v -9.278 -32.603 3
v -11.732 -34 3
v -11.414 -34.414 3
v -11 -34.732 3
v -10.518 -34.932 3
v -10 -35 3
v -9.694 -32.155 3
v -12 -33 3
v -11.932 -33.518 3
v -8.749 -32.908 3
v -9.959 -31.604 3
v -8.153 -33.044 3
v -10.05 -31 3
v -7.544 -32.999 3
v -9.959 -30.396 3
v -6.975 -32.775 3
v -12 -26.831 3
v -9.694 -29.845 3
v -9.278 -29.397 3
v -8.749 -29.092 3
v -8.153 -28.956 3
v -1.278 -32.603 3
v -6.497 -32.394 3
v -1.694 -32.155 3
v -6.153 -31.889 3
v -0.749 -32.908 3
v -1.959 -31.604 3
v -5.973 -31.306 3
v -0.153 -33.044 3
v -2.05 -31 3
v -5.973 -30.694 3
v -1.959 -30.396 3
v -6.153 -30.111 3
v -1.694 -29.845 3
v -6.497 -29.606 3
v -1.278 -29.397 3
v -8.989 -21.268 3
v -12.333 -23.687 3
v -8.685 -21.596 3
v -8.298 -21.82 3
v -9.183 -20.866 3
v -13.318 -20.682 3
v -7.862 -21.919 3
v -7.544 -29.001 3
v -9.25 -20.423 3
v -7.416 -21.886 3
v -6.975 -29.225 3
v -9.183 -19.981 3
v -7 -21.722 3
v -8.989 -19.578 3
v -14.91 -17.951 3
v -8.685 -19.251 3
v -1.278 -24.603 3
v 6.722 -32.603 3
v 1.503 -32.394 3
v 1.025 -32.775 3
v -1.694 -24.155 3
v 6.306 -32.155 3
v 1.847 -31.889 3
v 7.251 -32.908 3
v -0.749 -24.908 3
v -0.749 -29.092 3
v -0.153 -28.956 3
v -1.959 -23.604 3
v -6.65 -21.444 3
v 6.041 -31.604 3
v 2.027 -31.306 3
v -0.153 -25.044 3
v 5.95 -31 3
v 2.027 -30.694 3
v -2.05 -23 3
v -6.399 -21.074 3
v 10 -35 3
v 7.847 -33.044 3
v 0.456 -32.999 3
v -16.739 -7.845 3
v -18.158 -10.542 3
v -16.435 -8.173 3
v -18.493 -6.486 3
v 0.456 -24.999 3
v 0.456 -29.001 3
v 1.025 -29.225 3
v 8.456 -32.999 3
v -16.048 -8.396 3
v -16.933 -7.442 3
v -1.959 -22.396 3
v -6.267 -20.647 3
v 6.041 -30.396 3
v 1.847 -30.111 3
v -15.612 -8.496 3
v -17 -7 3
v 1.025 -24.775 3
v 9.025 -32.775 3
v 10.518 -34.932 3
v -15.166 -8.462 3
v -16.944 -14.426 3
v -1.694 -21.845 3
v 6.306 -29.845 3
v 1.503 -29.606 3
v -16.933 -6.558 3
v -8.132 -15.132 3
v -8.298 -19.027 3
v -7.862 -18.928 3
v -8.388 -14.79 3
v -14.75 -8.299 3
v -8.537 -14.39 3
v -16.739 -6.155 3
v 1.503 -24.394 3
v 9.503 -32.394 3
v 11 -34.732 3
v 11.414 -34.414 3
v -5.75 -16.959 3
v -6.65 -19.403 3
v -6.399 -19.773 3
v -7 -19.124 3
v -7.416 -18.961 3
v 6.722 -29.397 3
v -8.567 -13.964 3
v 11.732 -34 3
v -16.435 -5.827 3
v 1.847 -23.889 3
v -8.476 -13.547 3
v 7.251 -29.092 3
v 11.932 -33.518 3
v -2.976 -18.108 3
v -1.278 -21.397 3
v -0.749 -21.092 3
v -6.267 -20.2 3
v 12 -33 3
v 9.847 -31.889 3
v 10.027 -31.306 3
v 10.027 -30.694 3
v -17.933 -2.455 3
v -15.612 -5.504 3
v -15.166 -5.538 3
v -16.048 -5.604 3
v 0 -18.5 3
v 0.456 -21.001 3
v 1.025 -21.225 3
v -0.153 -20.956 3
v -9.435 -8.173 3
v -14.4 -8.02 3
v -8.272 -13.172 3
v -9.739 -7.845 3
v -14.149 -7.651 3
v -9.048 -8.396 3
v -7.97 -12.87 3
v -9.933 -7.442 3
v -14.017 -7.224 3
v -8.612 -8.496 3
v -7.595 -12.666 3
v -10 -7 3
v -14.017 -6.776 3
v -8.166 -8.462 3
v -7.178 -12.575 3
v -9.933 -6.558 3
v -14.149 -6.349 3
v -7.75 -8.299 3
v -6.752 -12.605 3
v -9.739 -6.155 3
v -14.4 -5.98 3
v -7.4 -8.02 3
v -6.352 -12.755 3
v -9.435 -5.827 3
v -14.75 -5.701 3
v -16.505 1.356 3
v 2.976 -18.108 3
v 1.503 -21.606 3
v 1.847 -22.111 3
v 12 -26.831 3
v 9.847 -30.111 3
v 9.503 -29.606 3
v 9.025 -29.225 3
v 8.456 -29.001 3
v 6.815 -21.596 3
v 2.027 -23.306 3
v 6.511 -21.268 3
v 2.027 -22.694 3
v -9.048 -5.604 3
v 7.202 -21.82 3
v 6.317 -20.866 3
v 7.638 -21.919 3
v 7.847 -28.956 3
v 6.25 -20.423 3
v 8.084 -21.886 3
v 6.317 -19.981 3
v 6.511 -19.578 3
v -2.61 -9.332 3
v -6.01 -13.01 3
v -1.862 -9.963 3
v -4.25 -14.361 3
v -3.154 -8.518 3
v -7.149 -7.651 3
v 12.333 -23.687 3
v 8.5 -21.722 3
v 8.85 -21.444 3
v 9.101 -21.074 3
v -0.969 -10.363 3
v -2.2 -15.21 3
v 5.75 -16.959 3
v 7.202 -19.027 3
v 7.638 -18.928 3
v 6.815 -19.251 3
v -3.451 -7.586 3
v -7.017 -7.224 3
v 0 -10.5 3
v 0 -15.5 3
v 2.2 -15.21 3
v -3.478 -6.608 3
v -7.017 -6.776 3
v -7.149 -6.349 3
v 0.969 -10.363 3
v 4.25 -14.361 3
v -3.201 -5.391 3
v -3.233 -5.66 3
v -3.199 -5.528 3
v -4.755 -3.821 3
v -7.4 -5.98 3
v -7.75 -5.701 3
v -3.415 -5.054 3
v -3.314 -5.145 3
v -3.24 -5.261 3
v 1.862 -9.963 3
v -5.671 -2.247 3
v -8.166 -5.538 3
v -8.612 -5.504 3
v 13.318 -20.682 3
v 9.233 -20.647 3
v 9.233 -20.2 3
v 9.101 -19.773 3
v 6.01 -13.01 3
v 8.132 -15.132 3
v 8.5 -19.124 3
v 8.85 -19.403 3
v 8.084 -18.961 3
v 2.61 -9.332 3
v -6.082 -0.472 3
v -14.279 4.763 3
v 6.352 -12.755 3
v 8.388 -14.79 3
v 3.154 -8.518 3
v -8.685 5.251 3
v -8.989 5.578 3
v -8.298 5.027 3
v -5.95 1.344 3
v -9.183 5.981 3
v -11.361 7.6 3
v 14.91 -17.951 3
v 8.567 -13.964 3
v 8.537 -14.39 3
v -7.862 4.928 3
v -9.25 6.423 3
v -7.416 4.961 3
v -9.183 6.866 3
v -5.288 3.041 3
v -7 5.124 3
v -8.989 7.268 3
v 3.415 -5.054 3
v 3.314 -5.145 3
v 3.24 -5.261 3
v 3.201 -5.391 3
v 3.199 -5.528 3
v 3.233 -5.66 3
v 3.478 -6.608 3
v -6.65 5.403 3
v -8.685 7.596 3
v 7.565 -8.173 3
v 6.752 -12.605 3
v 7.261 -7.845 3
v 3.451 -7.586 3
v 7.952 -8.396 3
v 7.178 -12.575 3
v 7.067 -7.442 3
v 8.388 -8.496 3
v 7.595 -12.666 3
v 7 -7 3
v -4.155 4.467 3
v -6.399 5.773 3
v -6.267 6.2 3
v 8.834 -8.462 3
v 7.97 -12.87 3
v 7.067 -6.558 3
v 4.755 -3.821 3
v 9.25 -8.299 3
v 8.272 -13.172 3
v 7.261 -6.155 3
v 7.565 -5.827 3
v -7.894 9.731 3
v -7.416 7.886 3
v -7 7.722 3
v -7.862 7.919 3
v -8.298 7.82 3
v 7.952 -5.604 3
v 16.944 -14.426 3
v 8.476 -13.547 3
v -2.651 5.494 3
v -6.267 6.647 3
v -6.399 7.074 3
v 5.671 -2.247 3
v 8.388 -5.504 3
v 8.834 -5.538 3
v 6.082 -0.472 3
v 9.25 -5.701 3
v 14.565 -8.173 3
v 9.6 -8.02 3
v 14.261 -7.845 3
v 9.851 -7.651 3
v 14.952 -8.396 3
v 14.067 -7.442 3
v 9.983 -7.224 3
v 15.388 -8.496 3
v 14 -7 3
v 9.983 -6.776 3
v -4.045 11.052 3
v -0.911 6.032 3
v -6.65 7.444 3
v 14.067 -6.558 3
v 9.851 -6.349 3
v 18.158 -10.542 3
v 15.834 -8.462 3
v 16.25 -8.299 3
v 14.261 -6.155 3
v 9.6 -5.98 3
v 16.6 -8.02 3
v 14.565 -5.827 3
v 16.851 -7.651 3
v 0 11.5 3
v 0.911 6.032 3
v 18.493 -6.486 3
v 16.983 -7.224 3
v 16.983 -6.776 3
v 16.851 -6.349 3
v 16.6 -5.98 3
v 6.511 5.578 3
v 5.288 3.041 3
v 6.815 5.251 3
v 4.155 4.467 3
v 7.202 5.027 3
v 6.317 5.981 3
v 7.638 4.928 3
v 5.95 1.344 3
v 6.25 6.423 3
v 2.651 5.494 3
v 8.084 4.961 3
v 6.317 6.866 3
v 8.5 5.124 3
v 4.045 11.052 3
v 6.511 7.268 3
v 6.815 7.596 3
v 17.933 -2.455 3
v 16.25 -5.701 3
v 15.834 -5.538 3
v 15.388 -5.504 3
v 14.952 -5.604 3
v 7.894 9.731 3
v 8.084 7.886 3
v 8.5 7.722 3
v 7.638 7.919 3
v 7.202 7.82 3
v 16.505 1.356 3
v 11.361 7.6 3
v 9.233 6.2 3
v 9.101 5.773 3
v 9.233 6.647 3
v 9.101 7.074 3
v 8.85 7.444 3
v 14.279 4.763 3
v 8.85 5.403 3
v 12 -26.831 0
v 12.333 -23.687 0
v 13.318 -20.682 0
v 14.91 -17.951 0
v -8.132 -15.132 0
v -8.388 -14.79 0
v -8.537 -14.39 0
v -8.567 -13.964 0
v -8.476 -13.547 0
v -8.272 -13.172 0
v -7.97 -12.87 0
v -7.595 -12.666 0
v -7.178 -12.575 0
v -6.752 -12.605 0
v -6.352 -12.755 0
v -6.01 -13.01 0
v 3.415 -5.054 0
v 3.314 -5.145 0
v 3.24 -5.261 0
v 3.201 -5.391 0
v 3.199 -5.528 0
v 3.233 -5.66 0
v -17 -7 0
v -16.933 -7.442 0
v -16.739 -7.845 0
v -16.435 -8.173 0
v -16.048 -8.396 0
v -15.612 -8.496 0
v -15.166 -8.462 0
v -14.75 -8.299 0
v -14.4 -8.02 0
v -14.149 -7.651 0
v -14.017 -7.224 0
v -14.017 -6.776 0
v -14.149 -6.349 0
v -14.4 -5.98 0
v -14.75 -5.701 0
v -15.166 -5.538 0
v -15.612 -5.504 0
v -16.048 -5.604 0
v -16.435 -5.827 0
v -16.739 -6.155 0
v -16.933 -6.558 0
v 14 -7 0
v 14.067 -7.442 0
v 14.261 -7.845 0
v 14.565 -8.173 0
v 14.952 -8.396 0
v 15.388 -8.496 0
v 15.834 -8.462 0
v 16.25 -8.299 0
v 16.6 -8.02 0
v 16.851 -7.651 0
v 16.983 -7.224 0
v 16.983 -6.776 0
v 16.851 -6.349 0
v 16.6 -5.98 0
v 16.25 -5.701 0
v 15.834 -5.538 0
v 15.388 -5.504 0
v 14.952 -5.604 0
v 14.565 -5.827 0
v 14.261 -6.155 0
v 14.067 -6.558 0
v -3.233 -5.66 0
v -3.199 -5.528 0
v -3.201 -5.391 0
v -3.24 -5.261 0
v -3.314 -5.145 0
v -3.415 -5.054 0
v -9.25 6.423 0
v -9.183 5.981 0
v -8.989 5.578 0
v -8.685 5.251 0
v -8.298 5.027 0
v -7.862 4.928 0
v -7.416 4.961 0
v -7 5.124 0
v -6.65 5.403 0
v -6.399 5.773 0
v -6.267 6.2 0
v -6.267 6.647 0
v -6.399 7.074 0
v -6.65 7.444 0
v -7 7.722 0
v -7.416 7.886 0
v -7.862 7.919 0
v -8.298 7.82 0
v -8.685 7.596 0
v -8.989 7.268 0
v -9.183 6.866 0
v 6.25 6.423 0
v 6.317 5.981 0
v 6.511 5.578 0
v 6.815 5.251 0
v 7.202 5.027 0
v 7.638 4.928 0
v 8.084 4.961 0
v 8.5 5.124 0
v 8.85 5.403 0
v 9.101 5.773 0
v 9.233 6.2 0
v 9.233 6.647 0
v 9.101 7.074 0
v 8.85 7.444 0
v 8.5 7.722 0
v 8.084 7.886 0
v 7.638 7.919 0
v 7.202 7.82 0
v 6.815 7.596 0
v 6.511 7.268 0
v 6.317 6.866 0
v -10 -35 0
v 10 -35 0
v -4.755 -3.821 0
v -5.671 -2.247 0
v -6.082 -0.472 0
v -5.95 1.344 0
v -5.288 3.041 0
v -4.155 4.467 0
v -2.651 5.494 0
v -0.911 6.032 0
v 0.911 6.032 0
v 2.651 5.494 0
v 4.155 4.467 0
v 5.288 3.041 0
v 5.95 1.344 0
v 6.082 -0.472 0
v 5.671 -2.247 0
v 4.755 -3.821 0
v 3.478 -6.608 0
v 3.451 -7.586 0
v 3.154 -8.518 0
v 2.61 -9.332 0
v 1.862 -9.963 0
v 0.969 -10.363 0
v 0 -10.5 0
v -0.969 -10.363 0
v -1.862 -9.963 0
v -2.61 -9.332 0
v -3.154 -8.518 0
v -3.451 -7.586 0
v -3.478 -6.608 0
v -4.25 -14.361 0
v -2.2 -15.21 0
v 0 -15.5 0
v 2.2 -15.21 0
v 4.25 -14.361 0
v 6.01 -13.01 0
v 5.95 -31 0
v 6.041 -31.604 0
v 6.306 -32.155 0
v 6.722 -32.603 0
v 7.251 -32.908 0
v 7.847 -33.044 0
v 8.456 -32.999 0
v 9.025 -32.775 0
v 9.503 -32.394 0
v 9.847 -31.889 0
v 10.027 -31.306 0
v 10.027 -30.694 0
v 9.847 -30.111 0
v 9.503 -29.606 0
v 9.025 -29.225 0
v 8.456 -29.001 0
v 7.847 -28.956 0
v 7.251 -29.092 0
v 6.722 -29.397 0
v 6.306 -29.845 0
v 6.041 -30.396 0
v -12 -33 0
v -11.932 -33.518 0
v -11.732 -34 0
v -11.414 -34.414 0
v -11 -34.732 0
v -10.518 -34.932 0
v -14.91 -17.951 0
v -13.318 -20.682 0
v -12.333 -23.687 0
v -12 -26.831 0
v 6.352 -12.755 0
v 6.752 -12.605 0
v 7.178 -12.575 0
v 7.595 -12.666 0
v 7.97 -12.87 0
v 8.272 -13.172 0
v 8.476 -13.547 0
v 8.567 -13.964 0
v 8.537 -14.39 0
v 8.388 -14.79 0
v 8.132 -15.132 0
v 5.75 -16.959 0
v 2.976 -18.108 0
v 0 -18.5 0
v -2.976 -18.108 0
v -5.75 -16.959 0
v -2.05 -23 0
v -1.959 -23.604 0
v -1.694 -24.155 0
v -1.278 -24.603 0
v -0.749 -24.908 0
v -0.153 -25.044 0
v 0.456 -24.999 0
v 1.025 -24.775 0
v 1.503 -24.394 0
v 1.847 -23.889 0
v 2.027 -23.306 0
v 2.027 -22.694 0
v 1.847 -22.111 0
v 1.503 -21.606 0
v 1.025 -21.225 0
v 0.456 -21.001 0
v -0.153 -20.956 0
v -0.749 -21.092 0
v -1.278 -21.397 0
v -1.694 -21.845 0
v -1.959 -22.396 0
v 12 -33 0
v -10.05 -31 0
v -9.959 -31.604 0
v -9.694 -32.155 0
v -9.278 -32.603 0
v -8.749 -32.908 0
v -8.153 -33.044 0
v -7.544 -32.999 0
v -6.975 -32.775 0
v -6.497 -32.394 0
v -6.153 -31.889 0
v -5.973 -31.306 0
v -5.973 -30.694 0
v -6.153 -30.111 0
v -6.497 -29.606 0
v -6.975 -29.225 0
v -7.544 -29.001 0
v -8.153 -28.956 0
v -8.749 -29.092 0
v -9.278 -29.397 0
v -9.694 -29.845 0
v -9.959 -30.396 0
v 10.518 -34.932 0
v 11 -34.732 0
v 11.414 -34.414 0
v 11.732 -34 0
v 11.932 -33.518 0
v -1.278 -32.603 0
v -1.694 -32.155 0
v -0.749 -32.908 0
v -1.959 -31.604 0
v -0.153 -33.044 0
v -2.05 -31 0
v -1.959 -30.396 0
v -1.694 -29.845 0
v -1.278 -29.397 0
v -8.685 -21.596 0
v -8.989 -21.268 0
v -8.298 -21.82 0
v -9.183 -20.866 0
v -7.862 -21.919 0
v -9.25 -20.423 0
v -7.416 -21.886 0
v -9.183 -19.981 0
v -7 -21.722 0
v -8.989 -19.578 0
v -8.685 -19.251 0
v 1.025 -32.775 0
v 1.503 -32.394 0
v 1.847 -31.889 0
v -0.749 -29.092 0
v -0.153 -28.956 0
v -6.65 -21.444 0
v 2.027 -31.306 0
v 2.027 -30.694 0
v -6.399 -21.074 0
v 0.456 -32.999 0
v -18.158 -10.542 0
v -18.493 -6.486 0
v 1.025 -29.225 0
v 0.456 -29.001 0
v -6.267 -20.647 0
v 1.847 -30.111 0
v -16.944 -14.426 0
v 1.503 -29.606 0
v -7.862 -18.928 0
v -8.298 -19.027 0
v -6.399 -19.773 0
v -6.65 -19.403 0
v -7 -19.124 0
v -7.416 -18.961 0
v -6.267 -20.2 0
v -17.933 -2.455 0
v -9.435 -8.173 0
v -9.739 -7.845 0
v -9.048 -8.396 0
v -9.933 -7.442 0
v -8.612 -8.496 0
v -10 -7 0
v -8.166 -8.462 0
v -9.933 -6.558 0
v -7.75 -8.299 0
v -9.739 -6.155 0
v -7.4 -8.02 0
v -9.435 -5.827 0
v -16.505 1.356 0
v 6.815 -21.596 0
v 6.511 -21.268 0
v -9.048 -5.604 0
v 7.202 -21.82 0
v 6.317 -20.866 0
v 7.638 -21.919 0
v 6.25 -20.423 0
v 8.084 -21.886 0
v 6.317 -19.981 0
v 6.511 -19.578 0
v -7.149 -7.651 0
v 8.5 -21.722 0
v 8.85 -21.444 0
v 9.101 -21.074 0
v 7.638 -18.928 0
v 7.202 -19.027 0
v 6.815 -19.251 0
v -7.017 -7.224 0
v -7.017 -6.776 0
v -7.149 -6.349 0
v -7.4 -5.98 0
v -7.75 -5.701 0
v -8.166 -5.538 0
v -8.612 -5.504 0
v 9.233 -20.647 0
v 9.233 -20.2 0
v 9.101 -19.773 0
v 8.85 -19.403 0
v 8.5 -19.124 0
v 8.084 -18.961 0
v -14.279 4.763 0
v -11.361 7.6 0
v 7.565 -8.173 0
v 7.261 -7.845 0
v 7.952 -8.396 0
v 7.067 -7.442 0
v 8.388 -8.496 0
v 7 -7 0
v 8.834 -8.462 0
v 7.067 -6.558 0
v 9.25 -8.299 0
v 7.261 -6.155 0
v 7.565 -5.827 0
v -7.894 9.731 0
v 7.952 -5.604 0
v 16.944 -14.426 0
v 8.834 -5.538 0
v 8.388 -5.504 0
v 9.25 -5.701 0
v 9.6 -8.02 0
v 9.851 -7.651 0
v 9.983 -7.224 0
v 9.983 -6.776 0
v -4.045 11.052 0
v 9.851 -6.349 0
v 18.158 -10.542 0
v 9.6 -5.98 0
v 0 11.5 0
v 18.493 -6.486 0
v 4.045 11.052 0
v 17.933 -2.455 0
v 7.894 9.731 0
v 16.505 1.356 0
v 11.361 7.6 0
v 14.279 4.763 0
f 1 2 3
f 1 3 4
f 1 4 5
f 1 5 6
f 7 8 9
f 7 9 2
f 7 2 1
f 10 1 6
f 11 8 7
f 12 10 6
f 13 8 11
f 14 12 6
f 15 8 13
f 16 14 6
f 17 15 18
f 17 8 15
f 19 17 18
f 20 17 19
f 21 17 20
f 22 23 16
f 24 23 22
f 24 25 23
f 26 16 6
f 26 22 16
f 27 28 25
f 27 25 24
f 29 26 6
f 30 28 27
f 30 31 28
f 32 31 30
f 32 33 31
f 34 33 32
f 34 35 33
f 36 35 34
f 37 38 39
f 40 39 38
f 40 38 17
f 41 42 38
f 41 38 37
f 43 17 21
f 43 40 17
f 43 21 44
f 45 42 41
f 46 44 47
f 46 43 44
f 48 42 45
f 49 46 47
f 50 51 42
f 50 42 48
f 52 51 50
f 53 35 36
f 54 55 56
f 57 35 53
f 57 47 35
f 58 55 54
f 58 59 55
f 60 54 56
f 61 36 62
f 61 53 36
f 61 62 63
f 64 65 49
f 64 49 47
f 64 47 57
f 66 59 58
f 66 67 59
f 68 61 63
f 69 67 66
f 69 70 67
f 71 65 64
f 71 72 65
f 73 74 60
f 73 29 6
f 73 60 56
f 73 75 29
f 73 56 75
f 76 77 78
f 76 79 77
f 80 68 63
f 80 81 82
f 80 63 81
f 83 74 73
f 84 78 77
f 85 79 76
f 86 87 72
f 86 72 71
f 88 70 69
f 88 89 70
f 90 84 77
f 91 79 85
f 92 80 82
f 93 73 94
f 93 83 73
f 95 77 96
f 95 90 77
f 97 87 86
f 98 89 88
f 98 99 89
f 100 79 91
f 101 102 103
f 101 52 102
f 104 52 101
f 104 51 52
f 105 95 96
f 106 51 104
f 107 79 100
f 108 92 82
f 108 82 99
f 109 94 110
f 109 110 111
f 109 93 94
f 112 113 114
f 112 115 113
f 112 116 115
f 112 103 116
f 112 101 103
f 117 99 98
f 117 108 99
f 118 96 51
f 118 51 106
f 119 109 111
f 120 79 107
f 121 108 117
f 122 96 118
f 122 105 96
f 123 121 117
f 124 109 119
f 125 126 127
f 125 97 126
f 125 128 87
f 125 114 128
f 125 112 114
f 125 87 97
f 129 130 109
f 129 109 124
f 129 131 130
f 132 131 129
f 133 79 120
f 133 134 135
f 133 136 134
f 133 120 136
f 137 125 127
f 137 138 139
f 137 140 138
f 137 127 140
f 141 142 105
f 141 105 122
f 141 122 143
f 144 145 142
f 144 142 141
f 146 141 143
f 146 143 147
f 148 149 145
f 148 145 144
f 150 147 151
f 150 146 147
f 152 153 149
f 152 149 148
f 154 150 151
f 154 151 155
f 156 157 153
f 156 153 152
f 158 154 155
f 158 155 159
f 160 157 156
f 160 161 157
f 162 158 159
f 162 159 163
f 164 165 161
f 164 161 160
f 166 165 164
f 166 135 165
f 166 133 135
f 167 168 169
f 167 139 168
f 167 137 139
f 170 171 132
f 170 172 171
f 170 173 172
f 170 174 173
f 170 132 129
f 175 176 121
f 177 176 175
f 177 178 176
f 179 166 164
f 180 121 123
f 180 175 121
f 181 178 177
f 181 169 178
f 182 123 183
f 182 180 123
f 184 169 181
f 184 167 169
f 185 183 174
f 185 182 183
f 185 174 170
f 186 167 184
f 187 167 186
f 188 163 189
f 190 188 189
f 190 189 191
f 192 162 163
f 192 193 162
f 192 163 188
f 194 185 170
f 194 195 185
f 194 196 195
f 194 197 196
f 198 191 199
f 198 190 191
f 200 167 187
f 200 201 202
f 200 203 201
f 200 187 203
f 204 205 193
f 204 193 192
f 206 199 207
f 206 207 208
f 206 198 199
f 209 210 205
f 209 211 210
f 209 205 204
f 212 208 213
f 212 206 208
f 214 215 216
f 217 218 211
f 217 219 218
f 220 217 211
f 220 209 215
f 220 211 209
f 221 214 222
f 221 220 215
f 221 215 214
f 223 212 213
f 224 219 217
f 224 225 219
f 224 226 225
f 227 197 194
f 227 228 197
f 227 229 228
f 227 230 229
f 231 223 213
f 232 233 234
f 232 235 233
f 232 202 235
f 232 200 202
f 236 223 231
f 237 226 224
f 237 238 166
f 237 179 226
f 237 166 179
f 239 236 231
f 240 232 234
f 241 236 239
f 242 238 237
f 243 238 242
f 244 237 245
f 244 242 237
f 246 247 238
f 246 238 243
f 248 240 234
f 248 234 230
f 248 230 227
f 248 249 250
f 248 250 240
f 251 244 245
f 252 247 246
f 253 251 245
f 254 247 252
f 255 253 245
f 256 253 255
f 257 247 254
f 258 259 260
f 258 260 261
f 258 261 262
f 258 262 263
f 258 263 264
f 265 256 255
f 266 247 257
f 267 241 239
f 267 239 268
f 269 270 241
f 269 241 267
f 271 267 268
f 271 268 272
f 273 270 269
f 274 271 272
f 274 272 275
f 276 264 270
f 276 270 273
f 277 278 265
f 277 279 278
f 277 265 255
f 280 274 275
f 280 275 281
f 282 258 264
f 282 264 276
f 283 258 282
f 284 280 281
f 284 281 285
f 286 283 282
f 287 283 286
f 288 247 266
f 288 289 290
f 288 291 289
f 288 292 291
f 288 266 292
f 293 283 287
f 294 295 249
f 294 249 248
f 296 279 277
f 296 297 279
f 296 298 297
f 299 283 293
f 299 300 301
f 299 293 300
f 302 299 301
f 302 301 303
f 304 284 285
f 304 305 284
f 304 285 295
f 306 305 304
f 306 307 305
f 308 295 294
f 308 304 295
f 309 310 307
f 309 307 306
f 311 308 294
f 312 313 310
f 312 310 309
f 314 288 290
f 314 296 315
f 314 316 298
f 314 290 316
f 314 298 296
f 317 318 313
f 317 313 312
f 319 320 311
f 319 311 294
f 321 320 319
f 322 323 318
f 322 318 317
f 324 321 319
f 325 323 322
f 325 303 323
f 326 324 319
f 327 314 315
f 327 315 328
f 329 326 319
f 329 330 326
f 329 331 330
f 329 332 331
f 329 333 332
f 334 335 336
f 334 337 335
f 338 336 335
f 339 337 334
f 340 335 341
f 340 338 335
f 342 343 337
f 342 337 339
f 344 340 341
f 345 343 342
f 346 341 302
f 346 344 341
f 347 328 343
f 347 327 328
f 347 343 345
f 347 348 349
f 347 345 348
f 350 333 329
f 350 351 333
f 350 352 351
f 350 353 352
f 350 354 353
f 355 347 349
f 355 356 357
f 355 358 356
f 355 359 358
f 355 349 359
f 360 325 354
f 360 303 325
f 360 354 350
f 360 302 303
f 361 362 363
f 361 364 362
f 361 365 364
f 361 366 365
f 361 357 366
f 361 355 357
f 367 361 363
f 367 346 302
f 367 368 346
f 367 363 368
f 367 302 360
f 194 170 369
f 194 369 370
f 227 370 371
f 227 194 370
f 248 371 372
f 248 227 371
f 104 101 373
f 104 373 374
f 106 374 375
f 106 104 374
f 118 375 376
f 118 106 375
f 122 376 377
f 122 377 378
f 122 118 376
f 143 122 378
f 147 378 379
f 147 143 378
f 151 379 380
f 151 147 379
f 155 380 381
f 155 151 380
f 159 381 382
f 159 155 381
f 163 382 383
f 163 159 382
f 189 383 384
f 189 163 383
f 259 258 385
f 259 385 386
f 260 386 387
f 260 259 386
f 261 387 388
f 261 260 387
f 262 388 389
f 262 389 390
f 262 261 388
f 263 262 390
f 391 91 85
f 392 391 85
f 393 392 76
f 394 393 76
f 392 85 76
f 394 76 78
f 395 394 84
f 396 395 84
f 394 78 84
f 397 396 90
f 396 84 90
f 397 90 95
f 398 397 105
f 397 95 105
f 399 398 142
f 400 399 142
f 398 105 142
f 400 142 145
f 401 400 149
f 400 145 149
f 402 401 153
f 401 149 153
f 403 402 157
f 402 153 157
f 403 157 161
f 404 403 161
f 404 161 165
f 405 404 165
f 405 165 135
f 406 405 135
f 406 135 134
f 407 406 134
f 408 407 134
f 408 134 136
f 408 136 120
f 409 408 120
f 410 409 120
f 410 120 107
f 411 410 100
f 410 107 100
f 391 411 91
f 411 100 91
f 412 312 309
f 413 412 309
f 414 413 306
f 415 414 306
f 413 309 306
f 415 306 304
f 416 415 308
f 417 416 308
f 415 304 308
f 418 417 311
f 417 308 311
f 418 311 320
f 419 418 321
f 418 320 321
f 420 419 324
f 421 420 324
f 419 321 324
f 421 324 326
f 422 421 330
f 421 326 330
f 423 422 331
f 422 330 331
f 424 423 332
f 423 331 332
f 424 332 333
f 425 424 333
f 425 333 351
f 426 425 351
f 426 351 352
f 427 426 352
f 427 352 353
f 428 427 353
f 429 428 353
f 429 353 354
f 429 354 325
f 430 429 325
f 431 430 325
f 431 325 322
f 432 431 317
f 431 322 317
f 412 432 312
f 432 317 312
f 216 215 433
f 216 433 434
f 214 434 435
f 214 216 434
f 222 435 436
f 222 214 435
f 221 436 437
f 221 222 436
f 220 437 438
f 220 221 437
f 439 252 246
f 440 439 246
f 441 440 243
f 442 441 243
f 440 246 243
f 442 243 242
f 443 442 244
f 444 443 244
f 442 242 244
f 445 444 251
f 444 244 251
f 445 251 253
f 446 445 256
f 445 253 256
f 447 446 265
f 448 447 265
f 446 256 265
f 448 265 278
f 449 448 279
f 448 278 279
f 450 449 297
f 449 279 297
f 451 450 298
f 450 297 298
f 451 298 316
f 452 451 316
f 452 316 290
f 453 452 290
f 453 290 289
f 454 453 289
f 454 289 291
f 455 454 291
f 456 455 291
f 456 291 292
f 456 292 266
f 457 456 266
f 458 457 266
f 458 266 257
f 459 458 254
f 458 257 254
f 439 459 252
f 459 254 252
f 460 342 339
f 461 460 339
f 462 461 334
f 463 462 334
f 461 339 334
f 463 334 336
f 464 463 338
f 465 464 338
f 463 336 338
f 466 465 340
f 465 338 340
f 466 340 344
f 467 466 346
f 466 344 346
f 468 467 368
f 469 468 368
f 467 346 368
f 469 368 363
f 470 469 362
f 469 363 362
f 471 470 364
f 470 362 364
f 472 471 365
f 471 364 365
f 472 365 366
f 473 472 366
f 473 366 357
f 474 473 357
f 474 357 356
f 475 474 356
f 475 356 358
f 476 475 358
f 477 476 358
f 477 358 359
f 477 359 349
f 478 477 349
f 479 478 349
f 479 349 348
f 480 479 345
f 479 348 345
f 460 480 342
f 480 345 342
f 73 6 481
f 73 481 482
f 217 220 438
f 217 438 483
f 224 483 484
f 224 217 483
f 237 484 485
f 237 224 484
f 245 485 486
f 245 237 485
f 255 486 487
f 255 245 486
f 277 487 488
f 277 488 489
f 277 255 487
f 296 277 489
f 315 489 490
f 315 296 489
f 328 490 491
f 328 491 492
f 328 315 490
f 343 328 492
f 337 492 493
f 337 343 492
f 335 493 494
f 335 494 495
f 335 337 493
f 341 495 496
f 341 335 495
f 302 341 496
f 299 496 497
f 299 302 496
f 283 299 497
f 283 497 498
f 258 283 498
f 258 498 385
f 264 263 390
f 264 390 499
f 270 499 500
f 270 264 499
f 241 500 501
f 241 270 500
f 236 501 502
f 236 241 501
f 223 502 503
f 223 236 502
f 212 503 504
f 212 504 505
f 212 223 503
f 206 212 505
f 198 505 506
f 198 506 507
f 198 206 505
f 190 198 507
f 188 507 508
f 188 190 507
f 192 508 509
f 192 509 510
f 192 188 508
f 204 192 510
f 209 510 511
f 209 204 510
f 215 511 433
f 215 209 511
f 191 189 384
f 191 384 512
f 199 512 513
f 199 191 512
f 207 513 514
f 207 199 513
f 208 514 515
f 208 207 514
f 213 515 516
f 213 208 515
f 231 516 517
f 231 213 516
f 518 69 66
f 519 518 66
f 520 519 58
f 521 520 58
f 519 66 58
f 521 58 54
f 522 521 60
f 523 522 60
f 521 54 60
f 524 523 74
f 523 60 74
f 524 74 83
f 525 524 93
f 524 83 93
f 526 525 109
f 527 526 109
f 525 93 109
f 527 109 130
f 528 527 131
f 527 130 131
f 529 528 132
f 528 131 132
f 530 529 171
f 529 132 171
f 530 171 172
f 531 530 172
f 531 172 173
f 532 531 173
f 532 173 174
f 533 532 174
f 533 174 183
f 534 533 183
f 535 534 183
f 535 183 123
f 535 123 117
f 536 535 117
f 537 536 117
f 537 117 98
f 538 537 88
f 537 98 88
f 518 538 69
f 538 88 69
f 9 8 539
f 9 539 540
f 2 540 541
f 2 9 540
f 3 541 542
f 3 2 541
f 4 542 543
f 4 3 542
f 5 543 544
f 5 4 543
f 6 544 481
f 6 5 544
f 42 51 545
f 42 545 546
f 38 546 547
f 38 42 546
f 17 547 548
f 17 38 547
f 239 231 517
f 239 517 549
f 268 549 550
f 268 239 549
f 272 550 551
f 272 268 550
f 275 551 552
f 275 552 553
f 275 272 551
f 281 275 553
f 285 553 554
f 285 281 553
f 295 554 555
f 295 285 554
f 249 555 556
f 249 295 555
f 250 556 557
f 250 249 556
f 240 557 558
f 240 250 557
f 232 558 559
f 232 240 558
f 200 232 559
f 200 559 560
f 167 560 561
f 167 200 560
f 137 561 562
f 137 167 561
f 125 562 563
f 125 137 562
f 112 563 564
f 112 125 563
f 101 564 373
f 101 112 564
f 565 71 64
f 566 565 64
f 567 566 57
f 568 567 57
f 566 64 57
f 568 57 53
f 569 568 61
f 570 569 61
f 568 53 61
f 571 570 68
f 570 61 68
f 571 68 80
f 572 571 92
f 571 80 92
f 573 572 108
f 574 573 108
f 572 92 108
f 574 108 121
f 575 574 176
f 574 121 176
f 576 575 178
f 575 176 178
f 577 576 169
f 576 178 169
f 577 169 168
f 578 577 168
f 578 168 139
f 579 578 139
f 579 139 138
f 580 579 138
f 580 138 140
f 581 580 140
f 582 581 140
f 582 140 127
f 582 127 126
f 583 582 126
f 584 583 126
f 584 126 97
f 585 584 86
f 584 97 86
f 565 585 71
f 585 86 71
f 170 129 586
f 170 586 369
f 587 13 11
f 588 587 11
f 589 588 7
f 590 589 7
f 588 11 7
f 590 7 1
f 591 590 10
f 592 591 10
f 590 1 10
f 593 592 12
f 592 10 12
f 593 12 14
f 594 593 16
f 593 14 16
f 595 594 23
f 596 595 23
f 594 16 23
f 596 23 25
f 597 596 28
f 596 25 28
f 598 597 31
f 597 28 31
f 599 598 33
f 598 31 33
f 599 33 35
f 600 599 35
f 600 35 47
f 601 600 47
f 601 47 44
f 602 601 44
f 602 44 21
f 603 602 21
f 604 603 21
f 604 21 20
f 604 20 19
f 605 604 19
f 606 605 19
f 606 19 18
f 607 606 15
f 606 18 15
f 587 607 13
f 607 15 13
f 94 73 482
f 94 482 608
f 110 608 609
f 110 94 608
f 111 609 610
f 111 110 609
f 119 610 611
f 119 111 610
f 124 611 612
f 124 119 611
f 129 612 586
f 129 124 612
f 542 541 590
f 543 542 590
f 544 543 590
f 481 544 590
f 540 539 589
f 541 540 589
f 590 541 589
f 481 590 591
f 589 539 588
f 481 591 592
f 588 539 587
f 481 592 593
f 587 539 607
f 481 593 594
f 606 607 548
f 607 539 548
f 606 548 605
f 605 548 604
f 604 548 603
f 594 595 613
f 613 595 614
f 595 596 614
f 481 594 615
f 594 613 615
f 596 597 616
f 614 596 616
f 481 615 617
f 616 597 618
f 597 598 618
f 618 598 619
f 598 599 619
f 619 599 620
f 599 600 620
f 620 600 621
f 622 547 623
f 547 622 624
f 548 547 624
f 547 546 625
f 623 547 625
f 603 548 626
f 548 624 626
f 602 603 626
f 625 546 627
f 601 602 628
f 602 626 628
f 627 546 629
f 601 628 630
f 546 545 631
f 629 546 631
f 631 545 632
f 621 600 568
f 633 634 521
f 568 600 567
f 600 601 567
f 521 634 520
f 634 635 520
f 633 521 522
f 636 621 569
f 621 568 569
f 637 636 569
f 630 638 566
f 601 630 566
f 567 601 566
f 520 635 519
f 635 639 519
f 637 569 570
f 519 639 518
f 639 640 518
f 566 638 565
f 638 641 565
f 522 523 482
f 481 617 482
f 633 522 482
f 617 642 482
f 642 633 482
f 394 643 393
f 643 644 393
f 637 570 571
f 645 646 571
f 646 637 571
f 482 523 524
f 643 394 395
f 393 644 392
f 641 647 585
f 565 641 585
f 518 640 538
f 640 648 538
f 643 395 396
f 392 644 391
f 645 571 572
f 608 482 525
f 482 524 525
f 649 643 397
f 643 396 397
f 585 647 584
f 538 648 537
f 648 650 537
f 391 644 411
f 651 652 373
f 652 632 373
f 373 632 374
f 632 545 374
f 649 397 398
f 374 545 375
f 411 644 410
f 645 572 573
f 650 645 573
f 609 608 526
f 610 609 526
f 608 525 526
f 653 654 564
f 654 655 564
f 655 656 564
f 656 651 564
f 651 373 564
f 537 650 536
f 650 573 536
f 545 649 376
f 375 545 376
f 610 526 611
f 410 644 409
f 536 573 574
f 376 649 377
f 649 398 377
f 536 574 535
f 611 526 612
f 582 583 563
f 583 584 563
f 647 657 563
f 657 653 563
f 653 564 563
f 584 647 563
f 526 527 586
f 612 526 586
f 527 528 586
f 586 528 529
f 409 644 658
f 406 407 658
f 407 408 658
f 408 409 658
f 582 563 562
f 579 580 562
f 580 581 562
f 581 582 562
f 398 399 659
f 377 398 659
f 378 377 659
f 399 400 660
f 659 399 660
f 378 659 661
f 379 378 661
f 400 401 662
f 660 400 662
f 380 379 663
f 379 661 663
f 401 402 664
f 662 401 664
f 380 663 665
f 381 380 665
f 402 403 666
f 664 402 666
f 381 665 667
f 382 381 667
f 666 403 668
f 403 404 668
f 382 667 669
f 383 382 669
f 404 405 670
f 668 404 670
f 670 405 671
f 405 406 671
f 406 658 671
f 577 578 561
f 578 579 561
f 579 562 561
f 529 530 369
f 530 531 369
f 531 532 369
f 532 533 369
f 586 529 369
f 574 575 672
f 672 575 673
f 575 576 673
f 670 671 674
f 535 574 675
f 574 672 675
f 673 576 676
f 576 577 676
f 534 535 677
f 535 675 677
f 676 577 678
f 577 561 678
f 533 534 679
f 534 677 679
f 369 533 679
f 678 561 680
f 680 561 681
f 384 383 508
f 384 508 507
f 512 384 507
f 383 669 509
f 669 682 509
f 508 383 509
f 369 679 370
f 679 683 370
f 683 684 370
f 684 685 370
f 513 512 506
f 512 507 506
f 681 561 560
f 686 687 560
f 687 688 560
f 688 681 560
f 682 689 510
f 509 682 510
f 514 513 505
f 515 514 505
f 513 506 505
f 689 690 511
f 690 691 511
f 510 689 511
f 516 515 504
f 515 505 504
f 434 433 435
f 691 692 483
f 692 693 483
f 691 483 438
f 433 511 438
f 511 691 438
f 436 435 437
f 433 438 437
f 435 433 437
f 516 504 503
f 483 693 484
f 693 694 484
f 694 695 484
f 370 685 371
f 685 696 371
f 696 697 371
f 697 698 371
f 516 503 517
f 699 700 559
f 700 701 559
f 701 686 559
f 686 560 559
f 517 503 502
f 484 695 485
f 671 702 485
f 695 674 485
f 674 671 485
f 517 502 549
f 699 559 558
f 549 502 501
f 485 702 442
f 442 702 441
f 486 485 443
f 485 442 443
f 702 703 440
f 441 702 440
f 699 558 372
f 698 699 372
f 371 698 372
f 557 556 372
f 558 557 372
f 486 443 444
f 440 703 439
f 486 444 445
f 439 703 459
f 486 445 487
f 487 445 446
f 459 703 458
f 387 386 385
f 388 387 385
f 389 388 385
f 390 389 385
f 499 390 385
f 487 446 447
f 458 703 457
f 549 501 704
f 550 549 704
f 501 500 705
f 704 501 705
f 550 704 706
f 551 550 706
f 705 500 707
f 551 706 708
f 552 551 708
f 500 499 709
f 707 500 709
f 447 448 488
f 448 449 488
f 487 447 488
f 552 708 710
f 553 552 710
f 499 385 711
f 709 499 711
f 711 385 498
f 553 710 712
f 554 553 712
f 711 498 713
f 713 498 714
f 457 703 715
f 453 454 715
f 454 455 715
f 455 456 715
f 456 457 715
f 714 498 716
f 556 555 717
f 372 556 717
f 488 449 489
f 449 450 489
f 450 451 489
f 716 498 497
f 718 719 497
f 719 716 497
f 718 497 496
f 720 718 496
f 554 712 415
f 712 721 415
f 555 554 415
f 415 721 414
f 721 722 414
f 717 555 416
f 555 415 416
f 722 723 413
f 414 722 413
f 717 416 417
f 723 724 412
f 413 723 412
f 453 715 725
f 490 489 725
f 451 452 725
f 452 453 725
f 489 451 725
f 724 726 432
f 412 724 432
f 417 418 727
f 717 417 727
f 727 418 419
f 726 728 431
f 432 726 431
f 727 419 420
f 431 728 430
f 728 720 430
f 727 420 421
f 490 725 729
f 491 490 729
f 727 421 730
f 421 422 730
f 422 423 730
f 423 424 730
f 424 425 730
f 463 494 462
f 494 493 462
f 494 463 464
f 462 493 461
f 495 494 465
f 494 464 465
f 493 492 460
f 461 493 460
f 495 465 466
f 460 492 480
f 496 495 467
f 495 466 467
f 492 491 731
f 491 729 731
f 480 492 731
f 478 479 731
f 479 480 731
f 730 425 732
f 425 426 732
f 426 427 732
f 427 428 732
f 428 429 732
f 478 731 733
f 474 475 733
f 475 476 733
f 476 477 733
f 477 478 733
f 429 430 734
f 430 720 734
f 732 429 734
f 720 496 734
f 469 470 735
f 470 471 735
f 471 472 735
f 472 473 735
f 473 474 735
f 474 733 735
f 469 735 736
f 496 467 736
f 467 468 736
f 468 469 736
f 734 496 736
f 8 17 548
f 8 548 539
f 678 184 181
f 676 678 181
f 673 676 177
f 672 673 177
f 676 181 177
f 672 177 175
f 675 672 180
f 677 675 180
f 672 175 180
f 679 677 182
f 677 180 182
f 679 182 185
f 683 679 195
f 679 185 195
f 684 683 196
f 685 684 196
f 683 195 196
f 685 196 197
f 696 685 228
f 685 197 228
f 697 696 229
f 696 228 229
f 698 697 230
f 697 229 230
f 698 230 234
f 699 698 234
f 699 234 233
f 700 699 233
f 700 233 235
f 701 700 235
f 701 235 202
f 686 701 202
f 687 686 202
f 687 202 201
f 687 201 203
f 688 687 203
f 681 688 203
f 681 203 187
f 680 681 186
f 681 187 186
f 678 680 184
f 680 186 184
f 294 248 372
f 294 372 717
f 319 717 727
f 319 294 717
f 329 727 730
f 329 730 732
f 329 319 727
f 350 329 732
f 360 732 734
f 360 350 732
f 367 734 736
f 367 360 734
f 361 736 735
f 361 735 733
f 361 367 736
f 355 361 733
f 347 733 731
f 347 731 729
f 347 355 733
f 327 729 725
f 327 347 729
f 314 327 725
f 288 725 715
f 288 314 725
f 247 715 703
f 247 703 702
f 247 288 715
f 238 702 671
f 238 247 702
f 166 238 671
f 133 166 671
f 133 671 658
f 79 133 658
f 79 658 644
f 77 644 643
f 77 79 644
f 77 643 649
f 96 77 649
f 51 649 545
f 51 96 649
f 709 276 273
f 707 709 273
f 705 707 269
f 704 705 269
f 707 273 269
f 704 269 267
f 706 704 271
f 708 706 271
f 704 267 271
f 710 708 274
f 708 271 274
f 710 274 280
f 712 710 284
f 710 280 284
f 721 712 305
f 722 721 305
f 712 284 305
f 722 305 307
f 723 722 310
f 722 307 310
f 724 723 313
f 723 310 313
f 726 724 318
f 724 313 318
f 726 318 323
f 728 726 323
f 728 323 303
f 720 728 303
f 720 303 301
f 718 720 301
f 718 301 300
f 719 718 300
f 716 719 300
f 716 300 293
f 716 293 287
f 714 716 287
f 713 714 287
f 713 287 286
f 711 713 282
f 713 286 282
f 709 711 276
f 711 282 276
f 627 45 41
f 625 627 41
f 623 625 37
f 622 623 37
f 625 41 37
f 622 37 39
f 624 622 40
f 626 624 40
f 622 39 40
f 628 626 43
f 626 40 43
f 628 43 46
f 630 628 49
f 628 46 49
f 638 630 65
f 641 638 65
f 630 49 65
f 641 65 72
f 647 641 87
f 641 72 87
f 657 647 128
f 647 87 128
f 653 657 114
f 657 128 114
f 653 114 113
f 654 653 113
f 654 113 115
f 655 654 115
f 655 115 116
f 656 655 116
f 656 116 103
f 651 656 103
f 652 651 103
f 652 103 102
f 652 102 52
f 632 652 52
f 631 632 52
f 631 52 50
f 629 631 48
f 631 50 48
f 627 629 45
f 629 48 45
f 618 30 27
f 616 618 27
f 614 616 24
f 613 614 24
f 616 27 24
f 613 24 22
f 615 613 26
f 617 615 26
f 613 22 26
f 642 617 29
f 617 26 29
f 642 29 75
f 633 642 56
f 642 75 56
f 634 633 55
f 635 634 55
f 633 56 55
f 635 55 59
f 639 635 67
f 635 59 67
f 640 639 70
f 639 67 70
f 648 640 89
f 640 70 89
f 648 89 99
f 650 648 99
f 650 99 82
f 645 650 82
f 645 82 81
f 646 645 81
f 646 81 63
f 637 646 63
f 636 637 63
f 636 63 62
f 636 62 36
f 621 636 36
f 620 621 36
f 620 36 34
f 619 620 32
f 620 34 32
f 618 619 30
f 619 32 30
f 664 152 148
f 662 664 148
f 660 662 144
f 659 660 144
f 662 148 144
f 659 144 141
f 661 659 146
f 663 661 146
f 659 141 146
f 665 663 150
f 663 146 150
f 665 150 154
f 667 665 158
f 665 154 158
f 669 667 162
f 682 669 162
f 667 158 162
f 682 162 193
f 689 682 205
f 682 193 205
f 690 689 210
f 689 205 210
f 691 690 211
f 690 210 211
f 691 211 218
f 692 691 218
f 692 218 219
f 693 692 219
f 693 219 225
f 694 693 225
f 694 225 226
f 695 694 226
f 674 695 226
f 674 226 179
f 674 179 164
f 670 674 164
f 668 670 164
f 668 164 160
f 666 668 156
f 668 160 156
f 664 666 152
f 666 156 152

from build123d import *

# Parameters (mm, degrees)
SKETCH1_R           = 2.05
SKETCH1_R_2         = 1.5
BOSS_EXTRUDE1_DEPTH = 3


with BuildPart() as part:
    # Sketch1 → Boss-Extrude1 (new body)
    with BuildSketch(Plane.XY.offset(3)):
        with BuildLine():
            Line((-12, -26.830532015), (-12, -33))
            ThreePointArc((-12, -33), (-11.414213562, -34.414213562), (-10, -35))
            Line((-10, -35), (10, -35))
            ThreePointArc((10, -35), (11.414213562, -34.414213562), (12, -33))
            Line((12, -33), (12, -26.830532015))
            ThreePointArc((12, -26.830532015), (12.746170978, -22.15844916), (14.910447761, -17.951189322))
            ThreePointArc((14.910447761, -17.951189322), (0, 11.5), (-14.910447761, -17.951189322))
            ThreePointArc((-14.910447761, -17.951189322), (-12.746170978, -22.15844916), (-12, -26.830532015))
        make_face()
        with Locations(Location((8, -31, 0), (0, 0, 180))):
            Circle(SKETCH1_R, mode=Mode.SUBTRACT)
        with Locations(Location((-8, -31, 0), (0, 0, 180))):
            Circle(SKETCH1_R, mode=Mode.SUBTRACT)
        with Locations(Location((0, -31, 0), (0, 0, 180))):
            Circle(SKETCH1_R, mode=Mode.SUBTRACT)
        with Locations(Location((-7.75, 6.423393759, 0), (0, 0, 180))):
            Circle(SKETCH1_R_2, mode=Mode.SUBTRACT)
        with Locations(Location((7.75, 6.423393759, 0), (0, 0, 180))):
            Circle(SKETCH1_R_2, mode=Mode.SUBTRACT)
        with Locations(Location((15.5, -7, 0), (0, 0, 180))):
            Circle(SKETCH1_R_2, mode=Mode.SUBTRACT)
        with Locations(Location((7.75, -20.423393759, 0), (0, 0, 180))):
            Circle(SKETCH1_R_2, mode=Mode.SUBTRACT)
        with Locations(Location((-7.75, -20.423393759, 0), (0, 0, 180))):
            Circle(SKETCH1_R_2, mode=Mode.SUBTRACT)
        with Locations(Location((-15.5, -7, 0), (0, 0, 180))):
            Circle(SKETCH1_R_2, mode=Mode.SUBTRACT)
        with Locations(Location((-8.5, -7, 0), (0, 0, 180))):
            Circle(SKETCH1_R_2, mode=Mode.SUBTRACT)
        with Locations(Location((0, -23, 0), (0, 0, 180))):
            Circle(SKETCH1_R, mode=Mode.SUBTRACT)
        with Locations(Location((8.5, -7, 0), (0, 0, 180))):
            Circle(SKETCH1_R_2, mode=Mode.SUBTRACT)
        with BuildLine():
            ThreePointArc((3.23332646, -5.66), (0, -10.5), (-3.23332646, -5.66))
            ThreePointArc((-3.23332646, -5.66), (-3.216371052, -5.324717761), (-3.415288556, -5.054285714))
            ThreePointArc((-3.415288556, -5.054285714), (0, 6.1), (3.415288556, -5.054285714))
            ThreePointArc((3.415288556, -5.054285714), (3.216371052, -5.324717761), (3.23332646, -5.66))
        make_face(mode=Mode.SUBTRACT)
        with BuildLine():
            ThreePointArc((6.01040764, -13.01040764), (8.131727984, -13.01040764), (8.131727984, -15.131727984))
            ThreePointArc((8.131727984, -15.131727984), (0, -18.5), (-8.131727984, -15.131727984))
            ThreePointArc((-8.131727984, -15.131727984), (-8.131727984, -13.01040764), (-6.01040764, -13.01040764))
            ThreePointArc((-6.01040764, -13.01040764), (0, -15.5), (6.01040764, -13.01040764))
        make_face(mode=Mode.SUBTRACT)
    extrude(amount=-BOSS_EXTRUDE1_DEPTH)


solid = part.part
